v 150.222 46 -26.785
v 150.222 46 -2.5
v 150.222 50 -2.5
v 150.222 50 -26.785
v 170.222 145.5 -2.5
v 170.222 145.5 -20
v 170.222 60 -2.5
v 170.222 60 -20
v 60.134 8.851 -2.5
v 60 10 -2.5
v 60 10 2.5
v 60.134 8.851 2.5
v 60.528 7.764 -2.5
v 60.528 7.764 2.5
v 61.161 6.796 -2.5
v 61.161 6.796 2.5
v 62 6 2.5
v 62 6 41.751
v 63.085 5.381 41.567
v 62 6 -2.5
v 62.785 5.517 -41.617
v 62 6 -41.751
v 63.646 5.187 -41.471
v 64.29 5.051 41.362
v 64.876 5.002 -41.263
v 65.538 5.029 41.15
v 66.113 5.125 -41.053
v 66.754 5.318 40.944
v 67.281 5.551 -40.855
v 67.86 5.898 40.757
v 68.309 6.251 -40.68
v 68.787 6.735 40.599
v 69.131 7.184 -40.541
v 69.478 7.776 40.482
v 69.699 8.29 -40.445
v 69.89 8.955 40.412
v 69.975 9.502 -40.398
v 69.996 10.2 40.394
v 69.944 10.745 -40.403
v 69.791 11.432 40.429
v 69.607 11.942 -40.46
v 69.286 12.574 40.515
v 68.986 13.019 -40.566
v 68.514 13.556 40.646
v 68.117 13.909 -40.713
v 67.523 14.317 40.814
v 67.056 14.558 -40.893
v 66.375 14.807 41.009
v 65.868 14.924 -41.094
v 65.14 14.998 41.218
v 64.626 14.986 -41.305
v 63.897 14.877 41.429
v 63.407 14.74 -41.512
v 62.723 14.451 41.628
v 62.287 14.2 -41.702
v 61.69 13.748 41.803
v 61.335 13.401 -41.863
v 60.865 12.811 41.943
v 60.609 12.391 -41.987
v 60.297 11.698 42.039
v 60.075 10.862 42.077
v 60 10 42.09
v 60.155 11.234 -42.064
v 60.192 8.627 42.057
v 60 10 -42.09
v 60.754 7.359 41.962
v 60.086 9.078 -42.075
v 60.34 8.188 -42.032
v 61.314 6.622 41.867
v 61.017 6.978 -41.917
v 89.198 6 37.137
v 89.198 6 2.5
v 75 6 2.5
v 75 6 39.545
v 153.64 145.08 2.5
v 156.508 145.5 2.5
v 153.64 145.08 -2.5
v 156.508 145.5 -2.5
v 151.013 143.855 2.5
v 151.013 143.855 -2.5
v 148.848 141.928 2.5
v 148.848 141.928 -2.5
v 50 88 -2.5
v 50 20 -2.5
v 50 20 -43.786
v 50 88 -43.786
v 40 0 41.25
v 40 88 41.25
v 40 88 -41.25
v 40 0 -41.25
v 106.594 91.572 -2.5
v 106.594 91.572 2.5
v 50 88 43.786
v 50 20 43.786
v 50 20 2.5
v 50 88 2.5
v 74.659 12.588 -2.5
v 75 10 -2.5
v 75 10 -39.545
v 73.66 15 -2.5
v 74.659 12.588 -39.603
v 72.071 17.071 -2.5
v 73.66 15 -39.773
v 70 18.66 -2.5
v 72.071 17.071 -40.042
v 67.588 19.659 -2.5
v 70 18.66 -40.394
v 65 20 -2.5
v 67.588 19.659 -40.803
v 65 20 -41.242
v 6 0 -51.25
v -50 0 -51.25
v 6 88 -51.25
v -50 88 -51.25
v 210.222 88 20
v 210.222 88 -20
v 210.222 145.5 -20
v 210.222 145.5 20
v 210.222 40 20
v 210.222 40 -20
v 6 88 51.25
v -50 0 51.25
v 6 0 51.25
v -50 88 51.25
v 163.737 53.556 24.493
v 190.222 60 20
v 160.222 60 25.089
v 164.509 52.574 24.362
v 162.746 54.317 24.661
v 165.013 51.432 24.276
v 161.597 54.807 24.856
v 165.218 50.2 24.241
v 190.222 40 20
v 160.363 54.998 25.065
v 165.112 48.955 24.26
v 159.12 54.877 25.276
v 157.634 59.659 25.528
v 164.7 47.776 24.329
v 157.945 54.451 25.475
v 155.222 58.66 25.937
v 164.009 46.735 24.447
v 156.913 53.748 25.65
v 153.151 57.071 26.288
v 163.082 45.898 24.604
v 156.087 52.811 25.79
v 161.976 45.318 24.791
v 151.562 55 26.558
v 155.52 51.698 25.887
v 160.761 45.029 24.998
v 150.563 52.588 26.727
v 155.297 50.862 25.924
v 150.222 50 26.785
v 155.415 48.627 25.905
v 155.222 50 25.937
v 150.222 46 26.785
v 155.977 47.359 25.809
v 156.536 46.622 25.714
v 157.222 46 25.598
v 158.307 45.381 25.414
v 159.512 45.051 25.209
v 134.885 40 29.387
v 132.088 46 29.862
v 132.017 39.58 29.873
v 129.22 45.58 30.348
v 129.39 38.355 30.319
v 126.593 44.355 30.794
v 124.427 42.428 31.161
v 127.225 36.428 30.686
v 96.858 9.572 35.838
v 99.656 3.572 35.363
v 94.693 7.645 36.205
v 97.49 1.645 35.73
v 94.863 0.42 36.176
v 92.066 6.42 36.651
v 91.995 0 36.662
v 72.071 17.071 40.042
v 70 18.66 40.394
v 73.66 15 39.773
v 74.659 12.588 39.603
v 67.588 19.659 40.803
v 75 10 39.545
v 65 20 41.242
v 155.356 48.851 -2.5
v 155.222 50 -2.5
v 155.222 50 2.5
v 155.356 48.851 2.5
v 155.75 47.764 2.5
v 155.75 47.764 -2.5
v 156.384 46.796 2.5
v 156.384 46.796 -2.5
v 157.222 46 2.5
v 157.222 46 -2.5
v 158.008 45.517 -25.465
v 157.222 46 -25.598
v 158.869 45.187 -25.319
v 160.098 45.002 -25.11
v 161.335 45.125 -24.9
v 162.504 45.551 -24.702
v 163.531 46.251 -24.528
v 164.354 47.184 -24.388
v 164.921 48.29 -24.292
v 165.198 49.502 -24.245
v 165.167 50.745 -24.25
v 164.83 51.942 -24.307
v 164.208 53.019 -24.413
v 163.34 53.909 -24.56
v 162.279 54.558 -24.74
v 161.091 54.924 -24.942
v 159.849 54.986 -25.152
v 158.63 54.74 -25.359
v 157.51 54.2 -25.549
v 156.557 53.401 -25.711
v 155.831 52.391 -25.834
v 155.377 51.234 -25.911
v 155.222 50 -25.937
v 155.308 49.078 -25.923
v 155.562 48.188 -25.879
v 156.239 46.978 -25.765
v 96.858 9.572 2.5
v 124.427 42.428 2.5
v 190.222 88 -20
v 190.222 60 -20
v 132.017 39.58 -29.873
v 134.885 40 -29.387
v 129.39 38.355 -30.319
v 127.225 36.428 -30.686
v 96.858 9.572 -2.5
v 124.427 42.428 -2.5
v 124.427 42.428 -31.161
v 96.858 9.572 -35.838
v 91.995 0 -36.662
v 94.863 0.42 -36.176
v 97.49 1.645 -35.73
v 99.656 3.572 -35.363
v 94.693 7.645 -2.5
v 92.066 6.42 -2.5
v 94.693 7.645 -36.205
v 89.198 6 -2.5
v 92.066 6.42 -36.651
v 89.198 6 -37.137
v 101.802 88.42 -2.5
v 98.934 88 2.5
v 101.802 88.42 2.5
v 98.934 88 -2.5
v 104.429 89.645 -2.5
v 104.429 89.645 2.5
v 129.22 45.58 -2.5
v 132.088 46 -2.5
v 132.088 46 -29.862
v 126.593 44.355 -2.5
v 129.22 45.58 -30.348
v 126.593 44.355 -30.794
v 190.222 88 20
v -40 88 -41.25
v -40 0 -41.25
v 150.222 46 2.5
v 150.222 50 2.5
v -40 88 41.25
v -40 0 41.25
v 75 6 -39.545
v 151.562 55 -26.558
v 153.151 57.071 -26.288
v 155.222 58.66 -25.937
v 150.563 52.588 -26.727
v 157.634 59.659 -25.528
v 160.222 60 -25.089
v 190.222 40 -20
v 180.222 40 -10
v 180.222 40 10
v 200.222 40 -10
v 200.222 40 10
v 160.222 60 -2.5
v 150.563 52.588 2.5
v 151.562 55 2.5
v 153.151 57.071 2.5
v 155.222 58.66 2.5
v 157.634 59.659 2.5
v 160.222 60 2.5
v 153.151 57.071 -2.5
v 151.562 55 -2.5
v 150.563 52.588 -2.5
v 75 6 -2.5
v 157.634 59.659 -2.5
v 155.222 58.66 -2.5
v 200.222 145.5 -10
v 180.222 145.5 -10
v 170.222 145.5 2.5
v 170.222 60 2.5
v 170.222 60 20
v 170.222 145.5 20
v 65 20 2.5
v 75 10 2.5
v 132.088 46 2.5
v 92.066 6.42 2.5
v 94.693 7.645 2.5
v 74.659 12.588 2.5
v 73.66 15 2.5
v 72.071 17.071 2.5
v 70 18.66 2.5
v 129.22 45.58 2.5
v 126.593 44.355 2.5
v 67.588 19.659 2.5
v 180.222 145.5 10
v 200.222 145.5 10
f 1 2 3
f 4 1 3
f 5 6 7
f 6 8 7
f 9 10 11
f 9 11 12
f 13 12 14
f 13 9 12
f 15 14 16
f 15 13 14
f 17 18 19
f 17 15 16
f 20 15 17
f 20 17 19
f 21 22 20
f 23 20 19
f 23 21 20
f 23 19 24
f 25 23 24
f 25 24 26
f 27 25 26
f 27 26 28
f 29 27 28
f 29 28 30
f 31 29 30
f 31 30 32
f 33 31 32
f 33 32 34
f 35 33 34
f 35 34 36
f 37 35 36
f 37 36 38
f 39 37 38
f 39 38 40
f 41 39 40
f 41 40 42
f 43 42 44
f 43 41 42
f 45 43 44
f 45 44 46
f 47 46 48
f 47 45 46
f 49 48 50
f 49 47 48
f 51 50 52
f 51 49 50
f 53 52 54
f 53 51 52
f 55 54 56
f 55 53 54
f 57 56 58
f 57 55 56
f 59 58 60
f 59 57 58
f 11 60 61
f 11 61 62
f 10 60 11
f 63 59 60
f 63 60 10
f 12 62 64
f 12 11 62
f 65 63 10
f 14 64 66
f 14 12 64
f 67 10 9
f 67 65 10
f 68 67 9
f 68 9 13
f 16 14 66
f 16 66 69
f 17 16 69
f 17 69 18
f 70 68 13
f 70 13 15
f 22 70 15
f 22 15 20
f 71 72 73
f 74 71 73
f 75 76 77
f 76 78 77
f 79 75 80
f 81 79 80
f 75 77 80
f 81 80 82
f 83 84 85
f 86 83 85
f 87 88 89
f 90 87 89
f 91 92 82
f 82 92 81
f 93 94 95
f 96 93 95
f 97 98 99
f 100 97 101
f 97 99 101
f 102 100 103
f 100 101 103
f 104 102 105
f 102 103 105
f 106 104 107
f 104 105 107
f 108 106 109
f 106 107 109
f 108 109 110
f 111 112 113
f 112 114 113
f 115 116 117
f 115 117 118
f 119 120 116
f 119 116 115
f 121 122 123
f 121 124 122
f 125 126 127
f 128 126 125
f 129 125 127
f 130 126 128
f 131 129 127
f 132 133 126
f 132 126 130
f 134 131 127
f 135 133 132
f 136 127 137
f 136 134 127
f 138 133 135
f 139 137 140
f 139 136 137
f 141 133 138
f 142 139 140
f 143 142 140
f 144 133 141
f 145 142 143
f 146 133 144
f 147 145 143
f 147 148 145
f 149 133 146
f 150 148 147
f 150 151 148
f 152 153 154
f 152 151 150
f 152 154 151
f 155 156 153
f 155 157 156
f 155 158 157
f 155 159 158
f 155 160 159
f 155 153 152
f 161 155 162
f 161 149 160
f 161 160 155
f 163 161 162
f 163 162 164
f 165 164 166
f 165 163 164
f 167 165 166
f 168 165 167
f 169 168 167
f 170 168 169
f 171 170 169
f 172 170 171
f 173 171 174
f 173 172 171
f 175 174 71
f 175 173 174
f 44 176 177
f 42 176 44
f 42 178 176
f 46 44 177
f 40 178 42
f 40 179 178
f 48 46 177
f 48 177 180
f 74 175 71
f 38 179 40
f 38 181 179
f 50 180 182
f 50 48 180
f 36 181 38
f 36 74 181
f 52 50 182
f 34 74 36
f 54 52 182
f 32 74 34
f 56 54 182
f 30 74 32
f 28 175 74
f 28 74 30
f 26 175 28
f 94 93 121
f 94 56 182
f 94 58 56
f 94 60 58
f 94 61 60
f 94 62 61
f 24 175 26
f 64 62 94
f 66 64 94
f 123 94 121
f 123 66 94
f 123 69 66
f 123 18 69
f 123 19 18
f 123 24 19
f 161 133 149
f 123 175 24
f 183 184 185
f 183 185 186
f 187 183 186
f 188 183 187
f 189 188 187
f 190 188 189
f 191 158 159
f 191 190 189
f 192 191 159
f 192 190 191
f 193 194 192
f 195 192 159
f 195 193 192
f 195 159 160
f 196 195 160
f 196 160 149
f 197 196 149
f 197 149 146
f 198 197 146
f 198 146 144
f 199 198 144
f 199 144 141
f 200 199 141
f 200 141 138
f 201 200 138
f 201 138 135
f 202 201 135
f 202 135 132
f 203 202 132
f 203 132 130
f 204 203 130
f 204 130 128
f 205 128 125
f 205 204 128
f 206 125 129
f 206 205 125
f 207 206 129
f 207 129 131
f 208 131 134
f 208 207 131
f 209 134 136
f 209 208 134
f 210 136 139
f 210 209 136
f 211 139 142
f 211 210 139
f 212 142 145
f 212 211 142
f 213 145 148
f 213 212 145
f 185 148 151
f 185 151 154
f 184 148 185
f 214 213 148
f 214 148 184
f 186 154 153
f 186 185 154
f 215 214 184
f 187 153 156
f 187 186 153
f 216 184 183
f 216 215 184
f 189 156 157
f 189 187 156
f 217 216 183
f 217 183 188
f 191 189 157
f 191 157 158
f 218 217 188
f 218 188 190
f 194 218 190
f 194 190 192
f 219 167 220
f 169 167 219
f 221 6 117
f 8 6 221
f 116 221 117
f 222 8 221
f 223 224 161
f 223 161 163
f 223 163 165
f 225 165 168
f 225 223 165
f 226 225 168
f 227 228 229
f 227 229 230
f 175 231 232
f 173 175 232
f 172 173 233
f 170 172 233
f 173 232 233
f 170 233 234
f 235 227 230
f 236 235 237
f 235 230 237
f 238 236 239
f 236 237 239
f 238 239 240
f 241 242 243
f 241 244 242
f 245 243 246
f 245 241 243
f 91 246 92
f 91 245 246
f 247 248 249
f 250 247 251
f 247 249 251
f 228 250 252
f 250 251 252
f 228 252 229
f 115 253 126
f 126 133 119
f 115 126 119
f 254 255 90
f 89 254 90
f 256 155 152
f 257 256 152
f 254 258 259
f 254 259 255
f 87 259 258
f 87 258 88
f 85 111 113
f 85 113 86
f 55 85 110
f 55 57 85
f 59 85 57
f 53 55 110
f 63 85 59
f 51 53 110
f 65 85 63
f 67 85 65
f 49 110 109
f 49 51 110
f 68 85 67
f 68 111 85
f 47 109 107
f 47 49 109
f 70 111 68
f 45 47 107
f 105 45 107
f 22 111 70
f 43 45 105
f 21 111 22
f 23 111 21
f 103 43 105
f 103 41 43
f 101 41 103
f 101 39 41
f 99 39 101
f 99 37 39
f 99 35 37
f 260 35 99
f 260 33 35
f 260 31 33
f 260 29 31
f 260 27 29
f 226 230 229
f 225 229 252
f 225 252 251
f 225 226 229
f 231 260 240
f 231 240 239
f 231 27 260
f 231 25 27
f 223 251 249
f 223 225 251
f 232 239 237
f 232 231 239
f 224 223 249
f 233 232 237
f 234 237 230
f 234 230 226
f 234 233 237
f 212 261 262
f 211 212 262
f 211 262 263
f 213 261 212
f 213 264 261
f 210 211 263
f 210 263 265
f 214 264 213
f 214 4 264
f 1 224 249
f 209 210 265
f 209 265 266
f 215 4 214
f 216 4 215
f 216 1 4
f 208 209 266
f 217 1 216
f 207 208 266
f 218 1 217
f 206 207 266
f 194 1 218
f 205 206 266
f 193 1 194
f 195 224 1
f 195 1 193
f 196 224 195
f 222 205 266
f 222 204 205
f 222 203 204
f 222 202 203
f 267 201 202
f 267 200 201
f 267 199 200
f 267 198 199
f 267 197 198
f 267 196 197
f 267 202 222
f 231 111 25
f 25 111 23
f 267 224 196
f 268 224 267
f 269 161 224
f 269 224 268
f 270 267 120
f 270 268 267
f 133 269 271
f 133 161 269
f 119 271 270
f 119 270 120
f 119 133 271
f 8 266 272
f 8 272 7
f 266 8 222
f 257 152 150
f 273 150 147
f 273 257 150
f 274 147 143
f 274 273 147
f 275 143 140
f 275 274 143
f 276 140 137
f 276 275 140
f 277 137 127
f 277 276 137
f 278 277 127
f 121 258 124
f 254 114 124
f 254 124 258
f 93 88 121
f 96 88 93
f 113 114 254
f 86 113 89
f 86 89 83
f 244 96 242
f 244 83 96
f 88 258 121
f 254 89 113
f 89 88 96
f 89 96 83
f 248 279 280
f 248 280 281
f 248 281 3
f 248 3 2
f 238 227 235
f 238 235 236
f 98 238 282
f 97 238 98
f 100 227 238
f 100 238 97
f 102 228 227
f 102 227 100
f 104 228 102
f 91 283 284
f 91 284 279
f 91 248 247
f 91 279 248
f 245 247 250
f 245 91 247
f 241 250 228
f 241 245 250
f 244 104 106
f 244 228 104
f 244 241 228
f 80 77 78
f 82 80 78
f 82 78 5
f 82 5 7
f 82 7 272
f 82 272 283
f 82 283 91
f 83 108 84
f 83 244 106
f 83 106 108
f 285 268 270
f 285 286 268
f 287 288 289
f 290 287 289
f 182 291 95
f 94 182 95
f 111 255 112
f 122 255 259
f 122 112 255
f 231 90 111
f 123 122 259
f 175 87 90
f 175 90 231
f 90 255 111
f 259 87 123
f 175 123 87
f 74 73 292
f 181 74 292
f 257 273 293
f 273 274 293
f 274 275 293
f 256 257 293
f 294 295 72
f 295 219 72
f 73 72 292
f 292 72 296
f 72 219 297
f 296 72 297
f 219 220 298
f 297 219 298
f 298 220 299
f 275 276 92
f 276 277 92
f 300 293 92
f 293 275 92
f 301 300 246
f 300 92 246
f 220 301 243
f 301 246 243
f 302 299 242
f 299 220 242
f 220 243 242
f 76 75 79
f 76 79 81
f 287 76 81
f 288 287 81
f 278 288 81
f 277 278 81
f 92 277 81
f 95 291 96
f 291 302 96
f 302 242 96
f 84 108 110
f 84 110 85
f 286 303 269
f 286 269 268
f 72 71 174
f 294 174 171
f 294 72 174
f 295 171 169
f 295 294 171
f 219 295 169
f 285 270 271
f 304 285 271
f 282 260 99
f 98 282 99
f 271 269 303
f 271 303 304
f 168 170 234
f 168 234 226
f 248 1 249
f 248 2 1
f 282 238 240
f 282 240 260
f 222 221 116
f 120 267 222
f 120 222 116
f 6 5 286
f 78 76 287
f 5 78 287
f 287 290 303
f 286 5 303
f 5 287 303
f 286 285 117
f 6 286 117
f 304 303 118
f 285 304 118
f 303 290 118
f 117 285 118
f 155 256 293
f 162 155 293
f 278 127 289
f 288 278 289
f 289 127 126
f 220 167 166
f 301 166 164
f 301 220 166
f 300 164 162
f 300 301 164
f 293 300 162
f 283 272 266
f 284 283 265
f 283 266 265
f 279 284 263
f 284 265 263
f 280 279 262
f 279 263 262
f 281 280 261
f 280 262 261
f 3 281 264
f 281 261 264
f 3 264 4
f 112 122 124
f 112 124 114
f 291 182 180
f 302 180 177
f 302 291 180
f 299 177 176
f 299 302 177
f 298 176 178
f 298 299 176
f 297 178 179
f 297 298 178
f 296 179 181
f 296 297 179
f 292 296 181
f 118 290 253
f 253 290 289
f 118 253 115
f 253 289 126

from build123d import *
from build123d.topology import SkipClean

# Parameters (mm, degrees)
ESQUISSE1_W                   = 100
ESQUISSE1_H                   = 102.5
ESQUISSE1_W_2                 = 80
ESQUISSE1_H_2                 = 82.5
BOSS_EXTRU_3_DEPTH            = 88
BOSS_EXTRU_4_DEPTH            = 102.5
ESQUISSE7_W                   = 40
ESQUISSE7_H                   = 40
ESQUISSE7_W_2                 = 20
ESQUISSE7_H_2                 = 20
BOSS_EXTRU_11_DEPTH           = 105.5
ENL_V_MAT_EXTRU_9_REACH       = 240.16
ESQUISSE13_W                  = 10
ESQUISSE13_H                  = 20
BOSS_EXTRU_12_DEPTH           = 2.5
ESQUISSE17_R                  = 5
ESQUISSE17_W                  = 40
ESQUISSE17_H                  = 20
BOSS_EXTRU_13_DEPTH           = 51.25
ENL_V_MAT_EXTRU_12_DEPTH      = 262.252326841
ENL_V_MAT_EXTRU_12_DEPTH_BACK = 262.252326841
ESQUISSE18_R                  = 5
ENL_V_MAT_EXTRU_13_REACH      = 234.659
ESQUISSE19_W                  = 10
ESQUISSE19_H                  = 20
CONG_1_R                      = 10
ENL_V_MAT_EXTRU_15_DEPTH      = 88


with BuildPart() as part:
    # Esquisse1 → Boss.-Extru.3 (new body)
    with BuildSketch(Plane(origin=(0, 0, 0), x_dir=(1, 0, 0), z_dir=(0, 1, 0))):
        Rectangle(ESQUISSE1_W, ESQUISSE1_H)
        Rectangle(ESQUISSE1_W_2, ESQUISSE1_H_2, mode=Mode.SUBTRACT)
    extrude(amount=BOSS_EXTRU_3_DEPTH)

    # Esquisse3 → Boss.-Extru.4 (add)
    with BuildSketch(Plane.XY.offset(51.25)):
        Polygon((50, 6), (50, 0), (96.658434537, 0), (130.222419784, 40), (190.222419784, 40), (190.222419784, 46), (127.424573836, 46), (93.860588588, 6), align=None)
    extrude(amount=-BOSS_EXTRU_4_DEPTH)

    # Esquisse7 → Boss.-Extru.11 (add)
    with BuildSketch(Plane.XZ.offset(-40)):
        with Locations((190.222419784, 0)):
            Rectangle(ESQUISSE7_W, ESQUISSE7_H)
        with Locations((190.222419784, 0)):
            Rectangle(ESQUISSE7_W_2, ESQUISSE7_H_2, mode=Mode.SUBTRACT)
    extrude(amount=-BOSS_EXTRU_11_DEPTH)

    # Esquisse13 → Enlèv. mat.-Extru.9 (cut, up to next)
    with BuildSketch(Plane(origin=(0, 46, 0), x_dir=(1, 0, 0), z_dir=(0, 1, 0)), mode=Mode.PRIVATE) as enl_v_mat_extru_9_sk1:
        with Locations((185.222419784, 0)):
            Rectangle(ESQUISSE13_W, ESQUISSE13_H)
    enl_v_mat_extru_9_tool1 = extrude(enl_v_mat_extru_9_sk1.sketch, amount=-ENL_V_MAT_EXTRU_9_REACH, mode=Mode.PRIVATE) & part.part
    add(enl_v_mat_extru_9_tool1.solids().sort_by_distance((185.22242, 46, 0))[0], mode=Mode.SUBTRACT)

    # Esquisse14 → Boss.-Extru.12 (add, symmetric)
    with BuildSketch(Plane.XY):
        Polygon((50, 88), (103.597078503, 88), (151.845307295, 145.5), (170.222419784, 145.5), (170.222419784, 46), (127.424573836, 46), (93.860588588, 6), (50, 6), align=None)
    extrude(amount=BOSS_EXTRU_12_DEPTH, both=True)

    # Esquisse17 → Boss.-Extru.13 (add, symmetric)
    # profile 1 of 2: a face of its own
    with BuildSketch(Plane.XY):
        Polygon((44, 20), (44, 0), (75, 0), (75, 6), (75, 20), align=None)
        with Locations((65, 10)):
            Circle(ESQUISSE17_R, mode=Mode.SUBTRACT)
    # profile 2 of 2: a face of its own
    with BuildSketch(Plane.XY):
        with Locations((170.222419784, 50)):
            Rectangle(ESQUISSE17_W, ESQUISSE17_H)
        with Locations((160.222419784, 50)):
            Circle(ESQUISSE17_R, mode=Mode.SUBTRACT)
    extrude(amount=BOSS_EXTRU_13_DEPTH, both=True)

    # Esquisse18 → Enlèv. mat.-Extru.12 (cut, two sides: drawn at the far end of the back side and taken through both)
    with SkipClean():  # the faces are left unmerged after this step: merging them gives an invalid solid
        with BuildSketch(Plane.XY.offset(2.5).offset(-ENL_V_MAT_EXTRU_12_DEPTH_BACK)):
            with Locations(Location((160.222419784, 50, 0), (0, 0, 180))):
                Circle(ESQUISSE18_R)
            with Locations(Location((65, 10, 0), (0, 0, 180))):
                Circle(ESQUISSE18_R)
        extrude(amount=ENL_V_MAT_EXTRU_12_DEPTH + ENL_V_MAT_EXTRU_12_DEPTH_BACK, mode=Mode.SUBTRACT)

    # Esquisse19 → Enlèv. mat.-Extru.13 (cut, up to next)
    with BuildSketch(Plane(origin=(0, 60, 0), x_dir=(1, 0, 0), z_dir=(0, 1, 0)), mode=Mode.PRIVATE) as enl_v_mat_extru_13_sk1:
        with Locations((185.222419784, 0)):
            Rectangle(ESQUISSE19_W, ESQUISSE19_H)
    enl_v_mat_extru_13_tool1 = extrude(enl_v_mat_extru_13_sk1.sketch, amount=-ENL_V_MAT_EXTRU_13_REACH, mode=Mode.PRIVATE) & part.part
    add(enl_v_mat_extru_13_tool1.solids().sort_by_distance((185.22242, 60, 0))[0], mode=Mode.SUBTRACT)

    # Congé1
    cong_1_edges = [part.edges().sort_by_distance(p)[0] for p in [
        (93.860588588, 6, 26.875),
        (127.424573836, 46, 26.875),
        (151.845307295, 145.5, 0),
        (103.597078503, 88, 0),
        (75, 20, 26.875),
        (75, 20, -26.875),
        (150.222419784, 60, 26.875),
        (150.222419784, 60, -26.875),
        (127.424573836, 46, -26.875),
        (93.860588588, 6, -26.875),
        (96.658434537, 0, 0),
        (130.222419784, 40, 0),
    ]]
    fillet(cong_1_edges, radius=CONG_1_R)

    # Esquisse20 → Enlèv. mat.-Extru.15 (cut)
    with SkipClean():  # the faces are left unmerged after this step: merging them gives an invalid solid
        with BuildSketch(Plane(origin=(0, 0, 0), x_dir=(1, 0, 0), z_dir=(0, 1, 0))):
            Polygon((6, 51.25), (190.222419784, 20), (210.222419784, 20), (210.222419784, 51.25), align=None)
            Polygon((210.222419784, -20), (190.222419784, -20), (6, -51.25), (210.222419784, -51.25), align=None)
        extrude(amount=ENL_V_MAT_EXTRU_15_DEPTH, mode=Mode.SUBTRACT)


solid = part.part
